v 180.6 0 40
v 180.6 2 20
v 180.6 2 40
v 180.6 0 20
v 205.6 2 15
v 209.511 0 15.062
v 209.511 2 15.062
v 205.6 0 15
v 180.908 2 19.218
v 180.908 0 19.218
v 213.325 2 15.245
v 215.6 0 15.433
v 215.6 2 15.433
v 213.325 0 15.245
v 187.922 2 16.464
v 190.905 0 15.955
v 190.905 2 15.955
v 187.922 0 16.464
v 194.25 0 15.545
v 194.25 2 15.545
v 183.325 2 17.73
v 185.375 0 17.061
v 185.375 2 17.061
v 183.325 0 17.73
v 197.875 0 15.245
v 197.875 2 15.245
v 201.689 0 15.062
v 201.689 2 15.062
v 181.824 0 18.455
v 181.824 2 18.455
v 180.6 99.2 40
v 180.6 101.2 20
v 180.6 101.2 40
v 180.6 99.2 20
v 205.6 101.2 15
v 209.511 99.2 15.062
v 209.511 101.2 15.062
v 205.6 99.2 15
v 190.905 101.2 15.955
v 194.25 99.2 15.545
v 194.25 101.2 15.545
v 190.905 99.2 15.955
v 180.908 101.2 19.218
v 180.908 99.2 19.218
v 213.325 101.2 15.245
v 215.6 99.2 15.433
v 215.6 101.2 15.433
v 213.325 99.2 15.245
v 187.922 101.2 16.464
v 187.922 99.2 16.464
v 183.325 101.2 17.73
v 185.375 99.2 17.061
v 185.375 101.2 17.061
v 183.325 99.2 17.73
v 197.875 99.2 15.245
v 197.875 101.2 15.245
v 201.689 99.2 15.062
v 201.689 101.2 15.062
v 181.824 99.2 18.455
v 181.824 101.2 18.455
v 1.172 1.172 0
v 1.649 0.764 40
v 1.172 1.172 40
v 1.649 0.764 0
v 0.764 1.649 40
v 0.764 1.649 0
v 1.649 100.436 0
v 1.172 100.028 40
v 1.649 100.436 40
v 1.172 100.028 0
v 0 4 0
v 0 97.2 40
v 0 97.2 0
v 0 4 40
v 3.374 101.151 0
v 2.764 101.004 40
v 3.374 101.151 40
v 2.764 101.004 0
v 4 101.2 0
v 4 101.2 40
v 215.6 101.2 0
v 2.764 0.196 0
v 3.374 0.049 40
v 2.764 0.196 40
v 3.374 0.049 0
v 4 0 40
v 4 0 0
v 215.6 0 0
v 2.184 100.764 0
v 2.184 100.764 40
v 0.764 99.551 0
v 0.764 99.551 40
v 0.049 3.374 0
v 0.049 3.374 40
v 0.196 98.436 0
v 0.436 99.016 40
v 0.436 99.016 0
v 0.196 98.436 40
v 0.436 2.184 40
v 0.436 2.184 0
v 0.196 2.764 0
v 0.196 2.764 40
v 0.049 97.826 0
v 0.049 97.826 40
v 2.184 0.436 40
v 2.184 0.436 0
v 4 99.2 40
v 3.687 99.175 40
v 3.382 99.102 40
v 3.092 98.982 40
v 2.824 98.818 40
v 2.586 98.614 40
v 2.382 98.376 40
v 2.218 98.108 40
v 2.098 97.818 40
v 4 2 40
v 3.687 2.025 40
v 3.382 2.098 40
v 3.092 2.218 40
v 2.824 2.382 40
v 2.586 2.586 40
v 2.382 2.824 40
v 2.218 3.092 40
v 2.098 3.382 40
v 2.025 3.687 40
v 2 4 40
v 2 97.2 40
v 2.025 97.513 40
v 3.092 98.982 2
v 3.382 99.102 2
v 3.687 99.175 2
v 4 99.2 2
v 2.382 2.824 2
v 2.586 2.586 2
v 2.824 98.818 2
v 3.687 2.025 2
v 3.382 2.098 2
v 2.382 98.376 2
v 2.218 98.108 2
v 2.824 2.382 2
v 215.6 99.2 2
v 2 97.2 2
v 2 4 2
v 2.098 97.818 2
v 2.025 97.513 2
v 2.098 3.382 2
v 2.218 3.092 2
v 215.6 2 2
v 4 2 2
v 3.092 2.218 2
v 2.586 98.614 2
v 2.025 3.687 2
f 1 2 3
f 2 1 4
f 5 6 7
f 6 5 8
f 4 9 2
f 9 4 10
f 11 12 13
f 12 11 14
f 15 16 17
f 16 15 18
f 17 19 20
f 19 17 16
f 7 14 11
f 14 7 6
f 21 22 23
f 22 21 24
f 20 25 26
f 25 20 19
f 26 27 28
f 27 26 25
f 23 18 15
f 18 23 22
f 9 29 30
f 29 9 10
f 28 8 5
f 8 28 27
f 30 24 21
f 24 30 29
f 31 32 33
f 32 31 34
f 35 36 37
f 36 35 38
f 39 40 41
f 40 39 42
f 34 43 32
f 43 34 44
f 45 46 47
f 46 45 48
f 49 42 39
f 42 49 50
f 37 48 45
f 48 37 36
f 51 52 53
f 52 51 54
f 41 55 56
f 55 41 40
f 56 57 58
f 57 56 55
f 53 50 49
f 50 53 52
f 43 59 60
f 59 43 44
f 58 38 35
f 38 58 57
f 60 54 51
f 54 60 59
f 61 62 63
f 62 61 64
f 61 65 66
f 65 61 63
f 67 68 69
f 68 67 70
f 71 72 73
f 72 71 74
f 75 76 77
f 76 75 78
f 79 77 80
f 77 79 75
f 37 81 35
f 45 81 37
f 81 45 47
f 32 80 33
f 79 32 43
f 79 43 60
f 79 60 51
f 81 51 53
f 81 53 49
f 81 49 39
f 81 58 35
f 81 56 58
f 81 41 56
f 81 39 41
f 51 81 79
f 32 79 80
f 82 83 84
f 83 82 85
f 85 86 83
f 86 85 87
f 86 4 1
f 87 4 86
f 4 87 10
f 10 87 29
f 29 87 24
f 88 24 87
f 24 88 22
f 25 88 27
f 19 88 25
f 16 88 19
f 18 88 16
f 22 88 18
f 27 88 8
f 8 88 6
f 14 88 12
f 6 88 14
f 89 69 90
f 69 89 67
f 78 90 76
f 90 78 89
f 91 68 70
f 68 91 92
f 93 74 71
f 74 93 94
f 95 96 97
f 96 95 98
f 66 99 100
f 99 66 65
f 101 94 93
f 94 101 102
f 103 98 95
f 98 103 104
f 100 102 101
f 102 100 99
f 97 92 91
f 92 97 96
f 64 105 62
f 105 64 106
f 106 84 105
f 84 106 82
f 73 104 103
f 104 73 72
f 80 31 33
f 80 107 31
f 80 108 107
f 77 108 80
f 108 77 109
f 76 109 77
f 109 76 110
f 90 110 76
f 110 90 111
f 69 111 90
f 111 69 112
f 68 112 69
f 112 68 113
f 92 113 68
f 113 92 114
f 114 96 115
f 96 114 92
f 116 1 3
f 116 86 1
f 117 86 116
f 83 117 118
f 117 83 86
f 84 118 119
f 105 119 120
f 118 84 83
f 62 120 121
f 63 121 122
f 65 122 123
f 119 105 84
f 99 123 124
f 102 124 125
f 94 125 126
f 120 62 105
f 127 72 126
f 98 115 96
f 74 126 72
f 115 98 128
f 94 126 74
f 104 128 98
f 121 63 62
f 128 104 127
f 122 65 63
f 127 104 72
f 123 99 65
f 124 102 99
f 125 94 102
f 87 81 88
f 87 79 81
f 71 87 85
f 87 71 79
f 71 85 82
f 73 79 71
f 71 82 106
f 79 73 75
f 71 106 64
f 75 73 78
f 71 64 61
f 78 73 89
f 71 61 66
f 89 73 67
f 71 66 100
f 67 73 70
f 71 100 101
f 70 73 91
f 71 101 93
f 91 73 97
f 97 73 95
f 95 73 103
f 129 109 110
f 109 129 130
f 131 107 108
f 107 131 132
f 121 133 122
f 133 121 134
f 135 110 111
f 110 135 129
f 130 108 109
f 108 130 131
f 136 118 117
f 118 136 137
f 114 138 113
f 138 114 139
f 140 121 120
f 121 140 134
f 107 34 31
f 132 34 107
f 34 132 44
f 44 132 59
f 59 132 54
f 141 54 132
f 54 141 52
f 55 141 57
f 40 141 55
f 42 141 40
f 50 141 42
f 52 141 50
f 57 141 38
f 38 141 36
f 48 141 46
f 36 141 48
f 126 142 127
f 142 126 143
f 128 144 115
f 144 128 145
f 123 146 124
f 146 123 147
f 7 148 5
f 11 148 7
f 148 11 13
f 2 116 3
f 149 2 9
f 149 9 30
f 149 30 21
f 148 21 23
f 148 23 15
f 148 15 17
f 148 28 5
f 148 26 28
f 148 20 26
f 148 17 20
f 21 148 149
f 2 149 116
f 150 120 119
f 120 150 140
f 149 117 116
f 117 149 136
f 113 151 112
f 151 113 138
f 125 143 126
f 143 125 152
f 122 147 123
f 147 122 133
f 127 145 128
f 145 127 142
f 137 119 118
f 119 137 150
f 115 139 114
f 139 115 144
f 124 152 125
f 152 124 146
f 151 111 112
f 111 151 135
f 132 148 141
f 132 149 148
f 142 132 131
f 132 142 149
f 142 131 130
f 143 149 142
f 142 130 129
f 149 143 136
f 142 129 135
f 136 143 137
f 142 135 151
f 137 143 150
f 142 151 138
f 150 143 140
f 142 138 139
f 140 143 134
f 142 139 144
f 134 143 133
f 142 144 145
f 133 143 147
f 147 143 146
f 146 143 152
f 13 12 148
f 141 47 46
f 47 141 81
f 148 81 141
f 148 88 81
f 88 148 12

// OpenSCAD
include <protective_storage_box.scad>
lid_angle = 0;
show_tray_in_assembly = false;
render_assembly = false;
tray_left();
